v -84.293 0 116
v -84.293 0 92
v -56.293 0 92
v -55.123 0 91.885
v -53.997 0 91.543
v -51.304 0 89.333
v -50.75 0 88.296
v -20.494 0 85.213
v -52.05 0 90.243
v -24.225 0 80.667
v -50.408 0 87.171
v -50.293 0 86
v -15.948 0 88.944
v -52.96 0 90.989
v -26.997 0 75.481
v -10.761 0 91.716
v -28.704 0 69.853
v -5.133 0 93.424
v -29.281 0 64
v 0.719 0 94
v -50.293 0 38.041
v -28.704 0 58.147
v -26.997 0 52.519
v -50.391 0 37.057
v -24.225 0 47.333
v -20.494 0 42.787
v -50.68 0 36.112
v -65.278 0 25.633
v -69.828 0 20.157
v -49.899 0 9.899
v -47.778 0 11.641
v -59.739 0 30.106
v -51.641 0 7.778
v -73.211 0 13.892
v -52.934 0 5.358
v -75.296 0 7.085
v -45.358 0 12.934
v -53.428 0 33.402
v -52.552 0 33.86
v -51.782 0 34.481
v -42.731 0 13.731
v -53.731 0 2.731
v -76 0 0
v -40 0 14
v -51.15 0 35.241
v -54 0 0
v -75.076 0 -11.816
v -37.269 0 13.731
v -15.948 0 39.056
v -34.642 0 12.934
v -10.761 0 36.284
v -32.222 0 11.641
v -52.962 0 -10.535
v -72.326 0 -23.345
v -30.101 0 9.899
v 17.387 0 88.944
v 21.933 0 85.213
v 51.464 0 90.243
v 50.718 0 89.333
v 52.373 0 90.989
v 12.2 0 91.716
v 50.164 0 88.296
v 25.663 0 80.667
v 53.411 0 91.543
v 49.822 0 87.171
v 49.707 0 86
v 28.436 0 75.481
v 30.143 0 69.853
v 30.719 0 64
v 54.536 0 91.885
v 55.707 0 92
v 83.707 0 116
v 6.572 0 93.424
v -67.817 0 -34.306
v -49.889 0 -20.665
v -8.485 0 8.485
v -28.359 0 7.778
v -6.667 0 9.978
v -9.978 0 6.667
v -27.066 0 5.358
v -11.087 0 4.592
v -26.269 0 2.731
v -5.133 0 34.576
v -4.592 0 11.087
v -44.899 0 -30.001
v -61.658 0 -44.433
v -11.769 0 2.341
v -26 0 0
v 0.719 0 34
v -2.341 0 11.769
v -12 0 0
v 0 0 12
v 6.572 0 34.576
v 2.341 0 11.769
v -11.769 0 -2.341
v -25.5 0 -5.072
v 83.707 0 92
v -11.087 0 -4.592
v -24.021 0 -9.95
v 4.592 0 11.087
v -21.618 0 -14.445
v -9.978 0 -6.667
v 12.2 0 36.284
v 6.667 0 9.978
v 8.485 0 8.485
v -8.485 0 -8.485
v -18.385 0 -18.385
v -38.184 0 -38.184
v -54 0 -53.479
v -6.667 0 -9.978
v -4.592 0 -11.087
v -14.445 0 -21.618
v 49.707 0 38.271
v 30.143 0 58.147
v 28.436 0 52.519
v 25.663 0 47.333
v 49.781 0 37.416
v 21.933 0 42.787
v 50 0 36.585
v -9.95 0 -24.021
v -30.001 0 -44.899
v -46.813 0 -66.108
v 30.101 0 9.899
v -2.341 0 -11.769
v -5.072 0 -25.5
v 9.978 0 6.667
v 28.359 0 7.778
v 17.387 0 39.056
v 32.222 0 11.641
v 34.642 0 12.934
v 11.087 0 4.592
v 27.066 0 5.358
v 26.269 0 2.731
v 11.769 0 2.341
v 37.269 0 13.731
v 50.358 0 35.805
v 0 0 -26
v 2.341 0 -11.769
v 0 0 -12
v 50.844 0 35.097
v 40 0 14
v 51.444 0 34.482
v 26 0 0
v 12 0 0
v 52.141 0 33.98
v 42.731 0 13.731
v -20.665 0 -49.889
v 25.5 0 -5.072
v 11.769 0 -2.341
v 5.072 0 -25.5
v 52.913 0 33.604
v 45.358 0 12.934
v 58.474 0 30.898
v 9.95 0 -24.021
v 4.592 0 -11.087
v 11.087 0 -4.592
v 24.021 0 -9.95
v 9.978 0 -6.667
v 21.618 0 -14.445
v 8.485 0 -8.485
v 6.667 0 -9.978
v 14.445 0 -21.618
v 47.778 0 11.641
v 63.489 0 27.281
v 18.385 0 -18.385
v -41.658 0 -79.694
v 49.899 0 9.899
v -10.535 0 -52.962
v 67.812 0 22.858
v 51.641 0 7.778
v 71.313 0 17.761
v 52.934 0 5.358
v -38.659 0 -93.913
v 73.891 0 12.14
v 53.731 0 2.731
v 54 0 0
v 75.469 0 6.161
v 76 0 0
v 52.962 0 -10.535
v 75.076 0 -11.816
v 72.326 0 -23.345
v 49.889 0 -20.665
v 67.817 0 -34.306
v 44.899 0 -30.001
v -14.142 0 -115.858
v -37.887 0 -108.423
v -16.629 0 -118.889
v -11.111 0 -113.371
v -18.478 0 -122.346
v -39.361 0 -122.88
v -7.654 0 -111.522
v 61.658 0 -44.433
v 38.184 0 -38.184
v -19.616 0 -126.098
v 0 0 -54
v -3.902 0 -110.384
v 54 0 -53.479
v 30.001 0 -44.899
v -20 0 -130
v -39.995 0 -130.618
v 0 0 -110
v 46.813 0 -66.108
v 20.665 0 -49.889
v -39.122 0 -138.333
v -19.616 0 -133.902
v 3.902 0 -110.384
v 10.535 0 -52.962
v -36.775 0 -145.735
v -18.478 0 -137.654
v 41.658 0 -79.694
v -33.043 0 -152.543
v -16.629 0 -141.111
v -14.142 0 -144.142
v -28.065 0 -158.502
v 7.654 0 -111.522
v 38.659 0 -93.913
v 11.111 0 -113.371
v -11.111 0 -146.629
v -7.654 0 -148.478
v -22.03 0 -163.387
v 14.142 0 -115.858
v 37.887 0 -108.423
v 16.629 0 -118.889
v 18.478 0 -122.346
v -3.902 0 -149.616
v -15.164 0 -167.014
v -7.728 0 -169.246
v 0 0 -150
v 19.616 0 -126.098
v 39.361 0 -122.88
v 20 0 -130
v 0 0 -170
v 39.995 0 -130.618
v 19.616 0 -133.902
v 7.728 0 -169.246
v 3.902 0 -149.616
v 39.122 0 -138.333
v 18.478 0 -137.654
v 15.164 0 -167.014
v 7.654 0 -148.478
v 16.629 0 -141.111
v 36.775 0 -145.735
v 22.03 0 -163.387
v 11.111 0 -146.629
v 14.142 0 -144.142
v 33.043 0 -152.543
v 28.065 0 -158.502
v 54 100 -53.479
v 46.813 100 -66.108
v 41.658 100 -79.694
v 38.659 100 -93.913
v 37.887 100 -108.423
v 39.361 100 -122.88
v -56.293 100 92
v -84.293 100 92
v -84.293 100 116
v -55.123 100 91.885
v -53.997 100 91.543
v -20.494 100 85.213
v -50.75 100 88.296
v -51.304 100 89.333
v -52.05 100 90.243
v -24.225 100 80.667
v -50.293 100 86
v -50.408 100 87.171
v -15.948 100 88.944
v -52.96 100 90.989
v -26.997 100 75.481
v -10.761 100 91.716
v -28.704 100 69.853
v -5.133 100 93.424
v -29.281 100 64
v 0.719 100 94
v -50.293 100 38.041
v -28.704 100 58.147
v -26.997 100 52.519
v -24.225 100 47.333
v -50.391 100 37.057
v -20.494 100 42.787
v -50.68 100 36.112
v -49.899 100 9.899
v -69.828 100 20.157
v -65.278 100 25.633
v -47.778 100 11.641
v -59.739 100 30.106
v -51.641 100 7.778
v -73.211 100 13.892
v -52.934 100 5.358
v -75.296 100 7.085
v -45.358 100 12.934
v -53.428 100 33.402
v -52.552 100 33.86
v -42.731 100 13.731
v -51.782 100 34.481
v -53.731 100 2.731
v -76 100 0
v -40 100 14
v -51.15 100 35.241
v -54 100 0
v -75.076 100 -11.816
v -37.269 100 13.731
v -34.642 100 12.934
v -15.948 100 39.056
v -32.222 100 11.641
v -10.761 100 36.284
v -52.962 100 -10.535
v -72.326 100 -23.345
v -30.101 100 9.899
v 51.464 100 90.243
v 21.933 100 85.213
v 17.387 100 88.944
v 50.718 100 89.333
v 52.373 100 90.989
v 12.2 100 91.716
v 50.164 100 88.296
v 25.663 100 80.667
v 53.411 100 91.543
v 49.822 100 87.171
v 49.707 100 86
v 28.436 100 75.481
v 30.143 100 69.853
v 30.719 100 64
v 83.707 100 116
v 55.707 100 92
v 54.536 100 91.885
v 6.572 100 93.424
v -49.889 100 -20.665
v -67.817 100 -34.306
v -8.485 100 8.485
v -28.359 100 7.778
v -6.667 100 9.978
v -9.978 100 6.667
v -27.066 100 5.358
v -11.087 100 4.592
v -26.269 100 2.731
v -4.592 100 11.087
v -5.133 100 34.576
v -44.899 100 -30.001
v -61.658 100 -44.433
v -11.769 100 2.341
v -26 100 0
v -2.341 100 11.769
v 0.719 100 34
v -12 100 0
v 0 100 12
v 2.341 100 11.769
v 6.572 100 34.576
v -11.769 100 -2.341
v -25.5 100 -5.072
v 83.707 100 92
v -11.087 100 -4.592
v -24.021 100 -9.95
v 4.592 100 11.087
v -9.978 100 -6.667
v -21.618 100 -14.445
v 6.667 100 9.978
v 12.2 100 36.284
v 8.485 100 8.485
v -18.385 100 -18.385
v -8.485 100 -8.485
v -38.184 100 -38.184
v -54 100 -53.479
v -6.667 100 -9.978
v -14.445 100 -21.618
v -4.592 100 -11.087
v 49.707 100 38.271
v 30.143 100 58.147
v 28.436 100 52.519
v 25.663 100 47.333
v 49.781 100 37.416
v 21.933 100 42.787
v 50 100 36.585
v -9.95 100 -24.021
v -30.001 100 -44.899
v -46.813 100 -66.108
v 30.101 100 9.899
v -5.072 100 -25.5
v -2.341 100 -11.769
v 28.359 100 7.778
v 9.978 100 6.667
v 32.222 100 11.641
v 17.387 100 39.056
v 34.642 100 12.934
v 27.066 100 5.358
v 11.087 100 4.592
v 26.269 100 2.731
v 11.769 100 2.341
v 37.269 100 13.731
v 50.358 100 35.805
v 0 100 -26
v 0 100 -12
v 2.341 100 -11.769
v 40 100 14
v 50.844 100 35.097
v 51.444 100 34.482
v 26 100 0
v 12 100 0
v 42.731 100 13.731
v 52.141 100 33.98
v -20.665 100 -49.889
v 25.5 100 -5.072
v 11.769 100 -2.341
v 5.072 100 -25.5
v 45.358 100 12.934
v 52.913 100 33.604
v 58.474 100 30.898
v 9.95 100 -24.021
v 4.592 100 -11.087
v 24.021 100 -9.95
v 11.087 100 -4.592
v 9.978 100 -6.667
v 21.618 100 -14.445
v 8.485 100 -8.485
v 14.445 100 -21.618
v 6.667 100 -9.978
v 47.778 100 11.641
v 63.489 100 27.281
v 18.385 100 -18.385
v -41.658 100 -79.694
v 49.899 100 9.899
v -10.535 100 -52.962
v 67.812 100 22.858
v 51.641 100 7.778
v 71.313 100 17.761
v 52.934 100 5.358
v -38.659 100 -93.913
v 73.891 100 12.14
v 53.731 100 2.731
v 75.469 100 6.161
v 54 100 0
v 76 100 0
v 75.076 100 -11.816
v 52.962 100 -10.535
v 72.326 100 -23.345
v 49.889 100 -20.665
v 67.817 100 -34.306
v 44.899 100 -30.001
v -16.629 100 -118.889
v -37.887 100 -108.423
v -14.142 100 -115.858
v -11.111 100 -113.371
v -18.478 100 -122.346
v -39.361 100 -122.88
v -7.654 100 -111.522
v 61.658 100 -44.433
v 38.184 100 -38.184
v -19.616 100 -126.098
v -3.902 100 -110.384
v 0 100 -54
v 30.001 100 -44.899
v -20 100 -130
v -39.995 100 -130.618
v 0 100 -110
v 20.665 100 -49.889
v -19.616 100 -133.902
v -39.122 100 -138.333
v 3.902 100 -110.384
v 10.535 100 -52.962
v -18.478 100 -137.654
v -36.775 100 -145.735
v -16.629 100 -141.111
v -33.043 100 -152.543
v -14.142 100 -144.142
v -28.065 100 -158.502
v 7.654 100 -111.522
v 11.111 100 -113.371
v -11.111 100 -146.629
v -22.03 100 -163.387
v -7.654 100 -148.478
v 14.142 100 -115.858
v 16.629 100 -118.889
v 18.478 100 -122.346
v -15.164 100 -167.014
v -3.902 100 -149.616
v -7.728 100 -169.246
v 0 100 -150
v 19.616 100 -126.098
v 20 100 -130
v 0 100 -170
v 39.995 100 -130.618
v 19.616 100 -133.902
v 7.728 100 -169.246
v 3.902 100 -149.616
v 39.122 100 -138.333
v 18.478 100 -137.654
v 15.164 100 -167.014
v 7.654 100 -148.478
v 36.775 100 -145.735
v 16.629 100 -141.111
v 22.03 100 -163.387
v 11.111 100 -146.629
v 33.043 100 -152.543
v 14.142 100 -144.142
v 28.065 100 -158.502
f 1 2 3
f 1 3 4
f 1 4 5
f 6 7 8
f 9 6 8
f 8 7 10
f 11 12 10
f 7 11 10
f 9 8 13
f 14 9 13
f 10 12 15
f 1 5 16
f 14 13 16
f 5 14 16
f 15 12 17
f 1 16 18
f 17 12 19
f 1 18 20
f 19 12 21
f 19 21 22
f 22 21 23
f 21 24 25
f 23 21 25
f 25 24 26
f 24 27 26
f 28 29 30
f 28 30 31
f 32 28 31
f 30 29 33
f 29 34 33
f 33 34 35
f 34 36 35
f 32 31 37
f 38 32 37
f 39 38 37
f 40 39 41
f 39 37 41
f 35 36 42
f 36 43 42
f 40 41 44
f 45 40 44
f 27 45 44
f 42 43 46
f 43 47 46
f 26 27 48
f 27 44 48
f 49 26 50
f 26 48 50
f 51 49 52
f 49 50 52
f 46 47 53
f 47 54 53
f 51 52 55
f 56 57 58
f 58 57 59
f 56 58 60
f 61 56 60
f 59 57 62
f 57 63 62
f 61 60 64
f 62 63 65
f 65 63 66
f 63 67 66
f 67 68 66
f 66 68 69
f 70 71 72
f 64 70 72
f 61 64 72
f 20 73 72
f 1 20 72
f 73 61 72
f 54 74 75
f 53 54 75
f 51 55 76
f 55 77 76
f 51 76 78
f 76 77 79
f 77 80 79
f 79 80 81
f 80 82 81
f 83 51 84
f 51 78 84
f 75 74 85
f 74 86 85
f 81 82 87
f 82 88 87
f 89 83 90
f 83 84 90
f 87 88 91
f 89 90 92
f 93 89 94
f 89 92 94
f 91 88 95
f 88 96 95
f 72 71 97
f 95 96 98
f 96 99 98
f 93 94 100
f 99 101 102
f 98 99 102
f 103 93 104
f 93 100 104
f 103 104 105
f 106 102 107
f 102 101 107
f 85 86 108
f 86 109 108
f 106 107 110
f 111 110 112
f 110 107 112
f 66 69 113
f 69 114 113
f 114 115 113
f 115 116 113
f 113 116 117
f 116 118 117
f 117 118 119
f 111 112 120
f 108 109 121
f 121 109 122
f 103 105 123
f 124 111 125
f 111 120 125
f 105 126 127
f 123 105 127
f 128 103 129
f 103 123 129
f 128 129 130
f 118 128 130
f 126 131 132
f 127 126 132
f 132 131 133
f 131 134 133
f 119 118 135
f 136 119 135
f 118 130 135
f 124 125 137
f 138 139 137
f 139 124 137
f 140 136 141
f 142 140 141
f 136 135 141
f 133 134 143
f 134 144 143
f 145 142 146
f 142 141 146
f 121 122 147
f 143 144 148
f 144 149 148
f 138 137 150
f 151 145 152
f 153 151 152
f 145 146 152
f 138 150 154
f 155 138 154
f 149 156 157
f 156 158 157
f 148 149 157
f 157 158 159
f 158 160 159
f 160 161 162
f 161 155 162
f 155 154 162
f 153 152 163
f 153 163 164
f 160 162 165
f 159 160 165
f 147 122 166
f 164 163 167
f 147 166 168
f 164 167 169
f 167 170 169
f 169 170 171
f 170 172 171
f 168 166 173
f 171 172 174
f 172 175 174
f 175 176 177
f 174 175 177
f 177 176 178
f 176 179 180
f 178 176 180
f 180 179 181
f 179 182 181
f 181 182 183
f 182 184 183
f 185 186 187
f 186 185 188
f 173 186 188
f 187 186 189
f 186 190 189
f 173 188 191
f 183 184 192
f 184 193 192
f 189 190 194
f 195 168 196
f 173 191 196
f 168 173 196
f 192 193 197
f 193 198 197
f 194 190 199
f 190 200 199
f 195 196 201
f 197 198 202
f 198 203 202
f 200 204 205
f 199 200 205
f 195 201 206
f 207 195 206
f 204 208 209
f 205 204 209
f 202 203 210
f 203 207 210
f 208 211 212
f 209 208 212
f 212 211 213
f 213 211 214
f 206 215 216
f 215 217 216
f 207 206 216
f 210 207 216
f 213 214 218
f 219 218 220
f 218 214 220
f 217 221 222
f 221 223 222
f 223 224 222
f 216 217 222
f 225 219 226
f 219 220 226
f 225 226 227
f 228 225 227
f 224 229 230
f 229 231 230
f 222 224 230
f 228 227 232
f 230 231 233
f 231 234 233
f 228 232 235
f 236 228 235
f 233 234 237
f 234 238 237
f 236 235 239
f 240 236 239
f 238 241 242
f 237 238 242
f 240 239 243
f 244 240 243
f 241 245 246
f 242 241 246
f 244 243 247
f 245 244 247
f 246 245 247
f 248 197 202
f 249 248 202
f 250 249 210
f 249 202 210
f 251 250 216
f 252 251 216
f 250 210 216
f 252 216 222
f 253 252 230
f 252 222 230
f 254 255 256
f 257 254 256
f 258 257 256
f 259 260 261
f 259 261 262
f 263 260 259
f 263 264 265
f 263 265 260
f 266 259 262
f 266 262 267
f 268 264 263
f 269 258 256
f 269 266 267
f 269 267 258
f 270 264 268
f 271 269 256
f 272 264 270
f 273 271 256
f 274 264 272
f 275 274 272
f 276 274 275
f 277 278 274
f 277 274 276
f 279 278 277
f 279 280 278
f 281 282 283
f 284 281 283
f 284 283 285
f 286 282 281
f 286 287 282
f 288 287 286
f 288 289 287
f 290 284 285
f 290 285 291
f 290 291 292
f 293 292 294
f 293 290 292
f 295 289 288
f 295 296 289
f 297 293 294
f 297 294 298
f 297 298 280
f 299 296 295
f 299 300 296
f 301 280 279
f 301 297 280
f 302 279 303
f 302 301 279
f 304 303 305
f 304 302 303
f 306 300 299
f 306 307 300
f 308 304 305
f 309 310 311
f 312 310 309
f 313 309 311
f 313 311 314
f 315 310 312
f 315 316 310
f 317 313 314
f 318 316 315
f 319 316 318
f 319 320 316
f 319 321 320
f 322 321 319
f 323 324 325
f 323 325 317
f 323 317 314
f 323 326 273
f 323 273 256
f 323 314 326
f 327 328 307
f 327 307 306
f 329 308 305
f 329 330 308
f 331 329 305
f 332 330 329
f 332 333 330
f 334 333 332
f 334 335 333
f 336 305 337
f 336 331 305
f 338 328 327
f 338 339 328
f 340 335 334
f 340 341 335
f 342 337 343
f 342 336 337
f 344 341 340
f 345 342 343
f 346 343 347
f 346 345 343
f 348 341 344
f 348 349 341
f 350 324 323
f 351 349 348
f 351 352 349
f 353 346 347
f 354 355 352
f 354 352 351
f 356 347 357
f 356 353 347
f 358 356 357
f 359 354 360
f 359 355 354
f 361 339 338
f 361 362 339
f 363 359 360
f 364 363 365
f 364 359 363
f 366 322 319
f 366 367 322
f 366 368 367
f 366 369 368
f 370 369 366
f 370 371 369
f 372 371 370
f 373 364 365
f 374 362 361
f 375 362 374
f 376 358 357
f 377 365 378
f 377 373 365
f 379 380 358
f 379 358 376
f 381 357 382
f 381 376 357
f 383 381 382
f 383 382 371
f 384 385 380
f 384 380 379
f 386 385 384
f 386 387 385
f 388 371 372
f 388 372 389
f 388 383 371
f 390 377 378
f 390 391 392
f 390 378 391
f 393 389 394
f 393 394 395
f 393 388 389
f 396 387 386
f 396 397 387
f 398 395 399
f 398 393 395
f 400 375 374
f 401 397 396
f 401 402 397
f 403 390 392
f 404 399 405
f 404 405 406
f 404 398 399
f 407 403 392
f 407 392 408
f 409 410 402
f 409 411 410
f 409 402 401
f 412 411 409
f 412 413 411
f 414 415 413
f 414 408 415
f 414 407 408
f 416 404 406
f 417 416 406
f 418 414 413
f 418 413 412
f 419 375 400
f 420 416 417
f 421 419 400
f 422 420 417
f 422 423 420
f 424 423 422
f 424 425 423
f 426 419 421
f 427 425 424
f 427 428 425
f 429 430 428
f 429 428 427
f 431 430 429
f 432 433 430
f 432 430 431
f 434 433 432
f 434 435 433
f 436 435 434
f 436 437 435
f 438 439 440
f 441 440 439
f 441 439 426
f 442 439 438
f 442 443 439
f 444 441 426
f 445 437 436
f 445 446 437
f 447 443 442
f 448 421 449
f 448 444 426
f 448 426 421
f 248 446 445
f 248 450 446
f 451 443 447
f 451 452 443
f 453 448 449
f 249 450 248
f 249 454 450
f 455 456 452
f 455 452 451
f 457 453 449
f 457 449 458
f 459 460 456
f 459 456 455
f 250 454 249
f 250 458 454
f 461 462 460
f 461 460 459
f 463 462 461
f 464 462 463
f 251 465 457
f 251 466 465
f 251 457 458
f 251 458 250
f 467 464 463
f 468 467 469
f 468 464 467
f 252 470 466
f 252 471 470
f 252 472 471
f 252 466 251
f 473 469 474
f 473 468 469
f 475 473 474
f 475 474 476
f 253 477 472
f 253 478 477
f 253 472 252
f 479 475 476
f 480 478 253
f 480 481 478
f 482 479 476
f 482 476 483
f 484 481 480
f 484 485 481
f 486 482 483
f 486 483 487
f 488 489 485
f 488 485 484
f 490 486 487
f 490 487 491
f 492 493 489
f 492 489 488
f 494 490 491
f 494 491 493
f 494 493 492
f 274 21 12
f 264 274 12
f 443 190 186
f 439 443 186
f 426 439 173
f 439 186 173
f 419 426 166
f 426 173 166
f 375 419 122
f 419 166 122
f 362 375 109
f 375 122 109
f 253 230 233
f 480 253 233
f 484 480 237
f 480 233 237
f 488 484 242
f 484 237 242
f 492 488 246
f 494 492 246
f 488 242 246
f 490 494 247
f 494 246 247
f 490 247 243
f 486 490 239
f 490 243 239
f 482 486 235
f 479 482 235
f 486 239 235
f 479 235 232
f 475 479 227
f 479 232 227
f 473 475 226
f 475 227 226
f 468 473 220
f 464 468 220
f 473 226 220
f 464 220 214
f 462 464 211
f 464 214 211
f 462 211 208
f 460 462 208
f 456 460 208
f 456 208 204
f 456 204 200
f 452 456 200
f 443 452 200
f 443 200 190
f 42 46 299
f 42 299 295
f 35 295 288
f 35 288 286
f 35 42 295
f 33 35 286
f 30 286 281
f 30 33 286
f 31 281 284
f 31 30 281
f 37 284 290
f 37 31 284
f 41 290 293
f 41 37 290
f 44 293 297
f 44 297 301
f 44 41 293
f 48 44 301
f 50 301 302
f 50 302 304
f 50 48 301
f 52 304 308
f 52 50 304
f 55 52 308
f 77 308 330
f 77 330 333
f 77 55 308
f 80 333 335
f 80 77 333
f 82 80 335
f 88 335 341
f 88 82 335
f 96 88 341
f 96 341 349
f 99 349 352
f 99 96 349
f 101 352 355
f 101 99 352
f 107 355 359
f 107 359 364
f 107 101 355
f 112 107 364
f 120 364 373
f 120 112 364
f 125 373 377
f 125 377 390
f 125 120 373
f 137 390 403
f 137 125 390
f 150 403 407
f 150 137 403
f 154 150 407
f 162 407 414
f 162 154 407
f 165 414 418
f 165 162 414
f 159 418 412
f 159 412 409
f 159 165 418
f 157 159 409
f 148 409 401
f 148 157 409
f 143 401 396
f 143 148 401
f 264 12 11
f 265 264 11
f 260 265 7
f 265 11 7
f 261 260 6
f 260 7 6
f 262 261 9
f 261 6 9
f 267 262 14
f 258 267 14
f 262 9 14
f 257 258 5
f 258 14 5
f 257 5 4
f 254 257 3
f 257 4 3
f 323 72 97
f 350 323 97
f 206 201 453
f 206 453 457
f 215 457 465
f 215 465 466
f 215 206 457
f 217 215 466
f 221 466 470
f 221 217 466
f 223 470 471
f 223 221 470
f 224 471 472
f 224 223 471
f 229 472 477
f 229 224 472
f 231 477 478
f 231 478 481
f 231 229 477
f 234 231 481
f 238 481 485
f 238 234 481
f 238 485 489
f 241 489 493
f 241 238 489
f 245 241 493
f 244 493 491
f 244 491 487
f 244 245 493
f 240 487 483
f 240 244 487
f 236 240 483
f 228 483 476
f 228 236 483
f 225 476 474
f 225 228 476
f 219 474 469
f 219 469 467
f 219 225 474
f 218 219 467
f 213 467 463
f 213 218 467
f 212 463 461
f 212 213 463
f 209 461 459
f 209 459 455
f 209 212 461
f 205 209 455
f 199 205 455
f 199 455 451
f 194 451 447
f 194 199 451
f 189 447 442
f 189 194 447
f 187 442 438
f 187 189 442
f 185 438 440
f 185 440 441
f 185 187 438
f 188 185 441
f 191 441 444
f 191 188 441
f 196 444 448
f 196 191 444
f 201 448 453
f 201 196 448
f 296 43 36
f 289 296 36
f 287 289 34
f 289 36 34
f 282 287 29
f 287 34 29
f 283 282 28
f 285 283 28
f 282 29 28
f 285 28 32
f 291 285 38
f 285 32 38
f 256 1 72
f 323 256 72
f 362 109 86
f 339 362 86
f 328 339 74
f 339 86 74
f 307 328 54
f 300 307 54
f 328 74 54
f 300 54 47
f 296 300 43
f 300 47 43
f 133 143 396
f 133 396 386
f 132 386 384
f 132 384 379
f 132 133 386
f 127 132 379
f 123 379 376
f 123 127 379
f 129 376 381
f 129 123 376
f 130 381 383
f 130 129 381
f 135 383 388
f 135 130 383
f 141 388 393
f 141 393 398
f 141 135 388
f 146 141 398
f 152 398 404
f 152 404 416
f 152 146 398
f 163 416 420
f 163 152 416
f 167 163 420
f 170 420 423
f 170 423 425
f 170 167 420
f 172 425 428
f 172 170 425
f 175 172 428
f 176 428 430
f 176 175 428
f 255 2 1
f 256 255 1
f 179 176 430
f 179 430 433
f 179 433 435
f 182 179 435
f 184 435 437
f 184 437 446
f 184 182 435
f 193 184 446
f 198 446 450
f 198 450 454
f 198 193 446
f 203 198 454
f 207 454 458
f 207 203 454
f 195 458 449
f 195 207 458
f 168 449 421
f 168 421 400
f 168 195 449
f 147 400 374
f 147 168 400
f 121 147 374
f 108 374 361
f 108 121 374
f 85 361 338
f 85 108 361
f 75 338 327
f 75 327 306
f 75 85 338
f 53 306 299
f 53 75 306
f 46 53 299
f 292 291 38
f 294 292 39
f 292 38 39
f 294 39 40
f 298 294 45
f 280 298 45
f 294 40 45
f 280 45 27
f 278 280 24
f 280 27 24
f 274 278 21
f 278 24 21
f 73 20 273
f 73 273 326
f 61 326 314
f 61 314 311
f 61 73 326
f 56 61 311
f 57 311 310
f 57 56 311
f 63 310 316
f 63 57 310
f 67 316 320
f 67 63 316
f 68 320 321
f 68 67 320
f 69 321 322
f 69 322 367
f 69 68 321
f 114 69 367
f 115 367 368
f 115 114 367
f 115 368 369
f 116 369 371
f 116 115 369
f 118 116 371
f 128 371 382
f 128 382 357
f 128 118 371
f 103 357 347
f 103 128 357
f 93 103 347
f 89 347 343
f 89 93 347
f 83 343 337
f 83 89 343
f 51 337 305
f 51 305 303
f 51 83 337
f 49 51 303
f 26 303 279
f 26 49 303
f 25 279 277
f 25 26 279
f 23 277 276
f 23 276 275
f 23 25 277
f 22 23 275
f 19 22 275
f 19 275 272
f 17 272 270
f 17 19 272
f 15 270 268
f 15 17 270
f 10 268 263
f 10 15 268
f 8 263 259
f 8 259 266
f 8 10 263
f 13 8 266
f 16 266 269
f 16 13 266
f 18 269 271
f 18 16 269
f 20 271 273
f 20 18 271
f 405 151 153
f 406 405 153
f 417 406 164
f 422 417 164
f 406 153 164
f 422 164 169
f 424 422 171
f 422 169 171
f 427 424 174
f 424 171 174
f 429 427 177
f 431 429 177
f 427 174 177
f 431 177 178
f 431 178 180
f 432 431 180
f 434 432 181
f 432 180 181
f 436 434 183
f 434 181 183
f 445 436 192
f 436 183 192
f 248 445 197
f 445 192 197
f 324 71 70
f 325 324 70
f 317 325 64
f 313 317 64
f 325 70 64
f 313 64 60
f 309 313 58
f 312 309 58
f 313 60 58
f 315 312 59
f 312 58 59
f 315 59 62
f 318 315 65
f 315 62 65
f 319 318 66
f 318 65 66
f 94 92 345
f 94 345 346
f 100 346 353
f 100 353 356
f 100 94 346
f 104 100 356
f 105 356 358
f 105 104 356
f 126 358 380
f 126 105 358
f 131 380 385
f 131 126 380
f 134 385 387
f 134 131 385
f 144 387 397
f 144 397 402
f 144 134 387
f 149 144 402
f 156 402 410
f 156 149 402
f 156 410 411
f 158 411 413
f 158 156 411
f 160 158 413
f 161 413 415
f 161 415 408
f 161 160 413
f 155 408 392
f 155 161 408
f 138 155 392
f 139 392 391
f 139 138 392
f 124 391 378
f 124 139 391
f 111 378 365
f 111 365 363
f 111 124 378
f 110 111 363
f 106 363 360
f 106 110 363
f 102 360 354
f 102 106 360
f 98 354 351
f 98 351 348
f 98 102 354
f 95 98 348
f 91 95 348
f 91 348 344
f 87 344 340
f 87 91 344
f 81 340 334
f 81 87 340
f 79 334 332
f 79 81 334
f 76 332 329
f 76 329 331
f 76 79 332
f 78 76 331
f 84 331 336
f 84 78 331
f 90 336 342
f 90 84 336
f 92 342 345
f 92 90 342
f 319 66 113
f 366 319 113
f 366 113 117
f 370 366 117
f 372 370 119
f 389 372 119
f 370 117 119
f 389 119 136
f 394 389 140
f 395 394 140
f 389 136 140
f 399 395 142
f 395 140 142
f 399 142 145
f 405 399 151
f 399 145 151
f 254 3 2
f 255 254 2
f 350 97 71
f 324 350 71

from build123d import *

# Parameters (mm, degrees)
SKETCH1_R           = 30
SKETCH1_R_2         = 12
SKETCH1_R_3         = 20
BOSS_EXTRUDE1_DEPTH = 100


with BuildPart() as part:
    # Sketch1 → Boss-Extrude1 (new body)
    with BuildSketch(Plane(origin=(0, 0, 0), x_dir=(1, 0, 0), z_dir=(0, 1, 0))):
        with BuildLine():
            Line((-84.293098865, -116), (83.706901135, -116))
            Line((83.706901135, -116), (83.706901135, -92))
            Line((83.706901135, -92), (55.706901135, -92))
            ThreePointArc((55.706901135, -92), (51.464260447, -90.242640687), (49.706901135, -86))
            Line((49.706901135, -86), (49.706901135, -38.271491466))
            ThreePointArc((49.706901135, -38.271491466), (50.585759142, -35.440204006), (52.913376606, -33.604236409))
            ThreePointArc((52.913376606, -33.604236409), (69.672222345, -20.385269709), (76, 0))
            ThreePointArc((76, 0), (70.285133563, 28.91366459), (54, 53.478967828))
            ThreePointArc((54, 53.478967828), (39.883656587, 86.745545299), (39.361130578, 122.87950847))
            ThreePointArc((39.361130578, 122.87950847), (0, 170), (-39.361130578, 122.87950847))
            ThreePointArc((-39.361130578, 122.87950847), (-39.883656587, 86.745545299), (-54, 53.478967828))
            ThreePointArc((-54, 53.478967828), (-70.285133563, 28.91366459), (-76, 0))
            ThreePointArc((-76, 0), (-69.827932589, -20.156746698), (-53.428086809, -33.401893429))
            ThreePointArc((-53.428086809, -33.401893429), (-51.15033045, -35.241497142), (-50.293098865, -38.041045294))
            Line((-50.293098865, -38.041045294), (-50.293098865, -86))
            ThreePointArc((-50.293098865, -86), (-52.050458178, -90.242640687), (-56.293098865, -92))
            Line((-56.293098865, -92), (-84.293098865, -92))
            Line((-84.293098865, -92), (-84.293098865, -116))
        make_face()
        with Locations(Location((0.719405778, -64, 0), (0, 0, 270))):
            Circle(SKETCH1_R, mode=Mode.SUBTRACT)
        with Locations(Location((0, 0, 0), (0, 0, 270))):
            Circle(SKETCH1_R_2, mode=Mode.SUBTRACT)
        with Locations(Location((0, 130, 0), (0, 0, 270))):
            Circle(SKETCH1_R_3, mode=Mode.SUBTRACT)
        with BuildLine():
            ThreePointArc((-54, 0), (-40, -14), (-26, 0))
            ThreePointArc((-26, 0), (0, 26), (26, 0))
            ThreePointArc((26, 0), (40, -14), (54, 0))
            ThreePointArc((54, 0), (0, 54), (-54, 0))
        make_face(mode=Mode.SUBTRACT)
    extrude(amount=BOSS_EXTRUDE1_DEPTH)


solid = part.part
